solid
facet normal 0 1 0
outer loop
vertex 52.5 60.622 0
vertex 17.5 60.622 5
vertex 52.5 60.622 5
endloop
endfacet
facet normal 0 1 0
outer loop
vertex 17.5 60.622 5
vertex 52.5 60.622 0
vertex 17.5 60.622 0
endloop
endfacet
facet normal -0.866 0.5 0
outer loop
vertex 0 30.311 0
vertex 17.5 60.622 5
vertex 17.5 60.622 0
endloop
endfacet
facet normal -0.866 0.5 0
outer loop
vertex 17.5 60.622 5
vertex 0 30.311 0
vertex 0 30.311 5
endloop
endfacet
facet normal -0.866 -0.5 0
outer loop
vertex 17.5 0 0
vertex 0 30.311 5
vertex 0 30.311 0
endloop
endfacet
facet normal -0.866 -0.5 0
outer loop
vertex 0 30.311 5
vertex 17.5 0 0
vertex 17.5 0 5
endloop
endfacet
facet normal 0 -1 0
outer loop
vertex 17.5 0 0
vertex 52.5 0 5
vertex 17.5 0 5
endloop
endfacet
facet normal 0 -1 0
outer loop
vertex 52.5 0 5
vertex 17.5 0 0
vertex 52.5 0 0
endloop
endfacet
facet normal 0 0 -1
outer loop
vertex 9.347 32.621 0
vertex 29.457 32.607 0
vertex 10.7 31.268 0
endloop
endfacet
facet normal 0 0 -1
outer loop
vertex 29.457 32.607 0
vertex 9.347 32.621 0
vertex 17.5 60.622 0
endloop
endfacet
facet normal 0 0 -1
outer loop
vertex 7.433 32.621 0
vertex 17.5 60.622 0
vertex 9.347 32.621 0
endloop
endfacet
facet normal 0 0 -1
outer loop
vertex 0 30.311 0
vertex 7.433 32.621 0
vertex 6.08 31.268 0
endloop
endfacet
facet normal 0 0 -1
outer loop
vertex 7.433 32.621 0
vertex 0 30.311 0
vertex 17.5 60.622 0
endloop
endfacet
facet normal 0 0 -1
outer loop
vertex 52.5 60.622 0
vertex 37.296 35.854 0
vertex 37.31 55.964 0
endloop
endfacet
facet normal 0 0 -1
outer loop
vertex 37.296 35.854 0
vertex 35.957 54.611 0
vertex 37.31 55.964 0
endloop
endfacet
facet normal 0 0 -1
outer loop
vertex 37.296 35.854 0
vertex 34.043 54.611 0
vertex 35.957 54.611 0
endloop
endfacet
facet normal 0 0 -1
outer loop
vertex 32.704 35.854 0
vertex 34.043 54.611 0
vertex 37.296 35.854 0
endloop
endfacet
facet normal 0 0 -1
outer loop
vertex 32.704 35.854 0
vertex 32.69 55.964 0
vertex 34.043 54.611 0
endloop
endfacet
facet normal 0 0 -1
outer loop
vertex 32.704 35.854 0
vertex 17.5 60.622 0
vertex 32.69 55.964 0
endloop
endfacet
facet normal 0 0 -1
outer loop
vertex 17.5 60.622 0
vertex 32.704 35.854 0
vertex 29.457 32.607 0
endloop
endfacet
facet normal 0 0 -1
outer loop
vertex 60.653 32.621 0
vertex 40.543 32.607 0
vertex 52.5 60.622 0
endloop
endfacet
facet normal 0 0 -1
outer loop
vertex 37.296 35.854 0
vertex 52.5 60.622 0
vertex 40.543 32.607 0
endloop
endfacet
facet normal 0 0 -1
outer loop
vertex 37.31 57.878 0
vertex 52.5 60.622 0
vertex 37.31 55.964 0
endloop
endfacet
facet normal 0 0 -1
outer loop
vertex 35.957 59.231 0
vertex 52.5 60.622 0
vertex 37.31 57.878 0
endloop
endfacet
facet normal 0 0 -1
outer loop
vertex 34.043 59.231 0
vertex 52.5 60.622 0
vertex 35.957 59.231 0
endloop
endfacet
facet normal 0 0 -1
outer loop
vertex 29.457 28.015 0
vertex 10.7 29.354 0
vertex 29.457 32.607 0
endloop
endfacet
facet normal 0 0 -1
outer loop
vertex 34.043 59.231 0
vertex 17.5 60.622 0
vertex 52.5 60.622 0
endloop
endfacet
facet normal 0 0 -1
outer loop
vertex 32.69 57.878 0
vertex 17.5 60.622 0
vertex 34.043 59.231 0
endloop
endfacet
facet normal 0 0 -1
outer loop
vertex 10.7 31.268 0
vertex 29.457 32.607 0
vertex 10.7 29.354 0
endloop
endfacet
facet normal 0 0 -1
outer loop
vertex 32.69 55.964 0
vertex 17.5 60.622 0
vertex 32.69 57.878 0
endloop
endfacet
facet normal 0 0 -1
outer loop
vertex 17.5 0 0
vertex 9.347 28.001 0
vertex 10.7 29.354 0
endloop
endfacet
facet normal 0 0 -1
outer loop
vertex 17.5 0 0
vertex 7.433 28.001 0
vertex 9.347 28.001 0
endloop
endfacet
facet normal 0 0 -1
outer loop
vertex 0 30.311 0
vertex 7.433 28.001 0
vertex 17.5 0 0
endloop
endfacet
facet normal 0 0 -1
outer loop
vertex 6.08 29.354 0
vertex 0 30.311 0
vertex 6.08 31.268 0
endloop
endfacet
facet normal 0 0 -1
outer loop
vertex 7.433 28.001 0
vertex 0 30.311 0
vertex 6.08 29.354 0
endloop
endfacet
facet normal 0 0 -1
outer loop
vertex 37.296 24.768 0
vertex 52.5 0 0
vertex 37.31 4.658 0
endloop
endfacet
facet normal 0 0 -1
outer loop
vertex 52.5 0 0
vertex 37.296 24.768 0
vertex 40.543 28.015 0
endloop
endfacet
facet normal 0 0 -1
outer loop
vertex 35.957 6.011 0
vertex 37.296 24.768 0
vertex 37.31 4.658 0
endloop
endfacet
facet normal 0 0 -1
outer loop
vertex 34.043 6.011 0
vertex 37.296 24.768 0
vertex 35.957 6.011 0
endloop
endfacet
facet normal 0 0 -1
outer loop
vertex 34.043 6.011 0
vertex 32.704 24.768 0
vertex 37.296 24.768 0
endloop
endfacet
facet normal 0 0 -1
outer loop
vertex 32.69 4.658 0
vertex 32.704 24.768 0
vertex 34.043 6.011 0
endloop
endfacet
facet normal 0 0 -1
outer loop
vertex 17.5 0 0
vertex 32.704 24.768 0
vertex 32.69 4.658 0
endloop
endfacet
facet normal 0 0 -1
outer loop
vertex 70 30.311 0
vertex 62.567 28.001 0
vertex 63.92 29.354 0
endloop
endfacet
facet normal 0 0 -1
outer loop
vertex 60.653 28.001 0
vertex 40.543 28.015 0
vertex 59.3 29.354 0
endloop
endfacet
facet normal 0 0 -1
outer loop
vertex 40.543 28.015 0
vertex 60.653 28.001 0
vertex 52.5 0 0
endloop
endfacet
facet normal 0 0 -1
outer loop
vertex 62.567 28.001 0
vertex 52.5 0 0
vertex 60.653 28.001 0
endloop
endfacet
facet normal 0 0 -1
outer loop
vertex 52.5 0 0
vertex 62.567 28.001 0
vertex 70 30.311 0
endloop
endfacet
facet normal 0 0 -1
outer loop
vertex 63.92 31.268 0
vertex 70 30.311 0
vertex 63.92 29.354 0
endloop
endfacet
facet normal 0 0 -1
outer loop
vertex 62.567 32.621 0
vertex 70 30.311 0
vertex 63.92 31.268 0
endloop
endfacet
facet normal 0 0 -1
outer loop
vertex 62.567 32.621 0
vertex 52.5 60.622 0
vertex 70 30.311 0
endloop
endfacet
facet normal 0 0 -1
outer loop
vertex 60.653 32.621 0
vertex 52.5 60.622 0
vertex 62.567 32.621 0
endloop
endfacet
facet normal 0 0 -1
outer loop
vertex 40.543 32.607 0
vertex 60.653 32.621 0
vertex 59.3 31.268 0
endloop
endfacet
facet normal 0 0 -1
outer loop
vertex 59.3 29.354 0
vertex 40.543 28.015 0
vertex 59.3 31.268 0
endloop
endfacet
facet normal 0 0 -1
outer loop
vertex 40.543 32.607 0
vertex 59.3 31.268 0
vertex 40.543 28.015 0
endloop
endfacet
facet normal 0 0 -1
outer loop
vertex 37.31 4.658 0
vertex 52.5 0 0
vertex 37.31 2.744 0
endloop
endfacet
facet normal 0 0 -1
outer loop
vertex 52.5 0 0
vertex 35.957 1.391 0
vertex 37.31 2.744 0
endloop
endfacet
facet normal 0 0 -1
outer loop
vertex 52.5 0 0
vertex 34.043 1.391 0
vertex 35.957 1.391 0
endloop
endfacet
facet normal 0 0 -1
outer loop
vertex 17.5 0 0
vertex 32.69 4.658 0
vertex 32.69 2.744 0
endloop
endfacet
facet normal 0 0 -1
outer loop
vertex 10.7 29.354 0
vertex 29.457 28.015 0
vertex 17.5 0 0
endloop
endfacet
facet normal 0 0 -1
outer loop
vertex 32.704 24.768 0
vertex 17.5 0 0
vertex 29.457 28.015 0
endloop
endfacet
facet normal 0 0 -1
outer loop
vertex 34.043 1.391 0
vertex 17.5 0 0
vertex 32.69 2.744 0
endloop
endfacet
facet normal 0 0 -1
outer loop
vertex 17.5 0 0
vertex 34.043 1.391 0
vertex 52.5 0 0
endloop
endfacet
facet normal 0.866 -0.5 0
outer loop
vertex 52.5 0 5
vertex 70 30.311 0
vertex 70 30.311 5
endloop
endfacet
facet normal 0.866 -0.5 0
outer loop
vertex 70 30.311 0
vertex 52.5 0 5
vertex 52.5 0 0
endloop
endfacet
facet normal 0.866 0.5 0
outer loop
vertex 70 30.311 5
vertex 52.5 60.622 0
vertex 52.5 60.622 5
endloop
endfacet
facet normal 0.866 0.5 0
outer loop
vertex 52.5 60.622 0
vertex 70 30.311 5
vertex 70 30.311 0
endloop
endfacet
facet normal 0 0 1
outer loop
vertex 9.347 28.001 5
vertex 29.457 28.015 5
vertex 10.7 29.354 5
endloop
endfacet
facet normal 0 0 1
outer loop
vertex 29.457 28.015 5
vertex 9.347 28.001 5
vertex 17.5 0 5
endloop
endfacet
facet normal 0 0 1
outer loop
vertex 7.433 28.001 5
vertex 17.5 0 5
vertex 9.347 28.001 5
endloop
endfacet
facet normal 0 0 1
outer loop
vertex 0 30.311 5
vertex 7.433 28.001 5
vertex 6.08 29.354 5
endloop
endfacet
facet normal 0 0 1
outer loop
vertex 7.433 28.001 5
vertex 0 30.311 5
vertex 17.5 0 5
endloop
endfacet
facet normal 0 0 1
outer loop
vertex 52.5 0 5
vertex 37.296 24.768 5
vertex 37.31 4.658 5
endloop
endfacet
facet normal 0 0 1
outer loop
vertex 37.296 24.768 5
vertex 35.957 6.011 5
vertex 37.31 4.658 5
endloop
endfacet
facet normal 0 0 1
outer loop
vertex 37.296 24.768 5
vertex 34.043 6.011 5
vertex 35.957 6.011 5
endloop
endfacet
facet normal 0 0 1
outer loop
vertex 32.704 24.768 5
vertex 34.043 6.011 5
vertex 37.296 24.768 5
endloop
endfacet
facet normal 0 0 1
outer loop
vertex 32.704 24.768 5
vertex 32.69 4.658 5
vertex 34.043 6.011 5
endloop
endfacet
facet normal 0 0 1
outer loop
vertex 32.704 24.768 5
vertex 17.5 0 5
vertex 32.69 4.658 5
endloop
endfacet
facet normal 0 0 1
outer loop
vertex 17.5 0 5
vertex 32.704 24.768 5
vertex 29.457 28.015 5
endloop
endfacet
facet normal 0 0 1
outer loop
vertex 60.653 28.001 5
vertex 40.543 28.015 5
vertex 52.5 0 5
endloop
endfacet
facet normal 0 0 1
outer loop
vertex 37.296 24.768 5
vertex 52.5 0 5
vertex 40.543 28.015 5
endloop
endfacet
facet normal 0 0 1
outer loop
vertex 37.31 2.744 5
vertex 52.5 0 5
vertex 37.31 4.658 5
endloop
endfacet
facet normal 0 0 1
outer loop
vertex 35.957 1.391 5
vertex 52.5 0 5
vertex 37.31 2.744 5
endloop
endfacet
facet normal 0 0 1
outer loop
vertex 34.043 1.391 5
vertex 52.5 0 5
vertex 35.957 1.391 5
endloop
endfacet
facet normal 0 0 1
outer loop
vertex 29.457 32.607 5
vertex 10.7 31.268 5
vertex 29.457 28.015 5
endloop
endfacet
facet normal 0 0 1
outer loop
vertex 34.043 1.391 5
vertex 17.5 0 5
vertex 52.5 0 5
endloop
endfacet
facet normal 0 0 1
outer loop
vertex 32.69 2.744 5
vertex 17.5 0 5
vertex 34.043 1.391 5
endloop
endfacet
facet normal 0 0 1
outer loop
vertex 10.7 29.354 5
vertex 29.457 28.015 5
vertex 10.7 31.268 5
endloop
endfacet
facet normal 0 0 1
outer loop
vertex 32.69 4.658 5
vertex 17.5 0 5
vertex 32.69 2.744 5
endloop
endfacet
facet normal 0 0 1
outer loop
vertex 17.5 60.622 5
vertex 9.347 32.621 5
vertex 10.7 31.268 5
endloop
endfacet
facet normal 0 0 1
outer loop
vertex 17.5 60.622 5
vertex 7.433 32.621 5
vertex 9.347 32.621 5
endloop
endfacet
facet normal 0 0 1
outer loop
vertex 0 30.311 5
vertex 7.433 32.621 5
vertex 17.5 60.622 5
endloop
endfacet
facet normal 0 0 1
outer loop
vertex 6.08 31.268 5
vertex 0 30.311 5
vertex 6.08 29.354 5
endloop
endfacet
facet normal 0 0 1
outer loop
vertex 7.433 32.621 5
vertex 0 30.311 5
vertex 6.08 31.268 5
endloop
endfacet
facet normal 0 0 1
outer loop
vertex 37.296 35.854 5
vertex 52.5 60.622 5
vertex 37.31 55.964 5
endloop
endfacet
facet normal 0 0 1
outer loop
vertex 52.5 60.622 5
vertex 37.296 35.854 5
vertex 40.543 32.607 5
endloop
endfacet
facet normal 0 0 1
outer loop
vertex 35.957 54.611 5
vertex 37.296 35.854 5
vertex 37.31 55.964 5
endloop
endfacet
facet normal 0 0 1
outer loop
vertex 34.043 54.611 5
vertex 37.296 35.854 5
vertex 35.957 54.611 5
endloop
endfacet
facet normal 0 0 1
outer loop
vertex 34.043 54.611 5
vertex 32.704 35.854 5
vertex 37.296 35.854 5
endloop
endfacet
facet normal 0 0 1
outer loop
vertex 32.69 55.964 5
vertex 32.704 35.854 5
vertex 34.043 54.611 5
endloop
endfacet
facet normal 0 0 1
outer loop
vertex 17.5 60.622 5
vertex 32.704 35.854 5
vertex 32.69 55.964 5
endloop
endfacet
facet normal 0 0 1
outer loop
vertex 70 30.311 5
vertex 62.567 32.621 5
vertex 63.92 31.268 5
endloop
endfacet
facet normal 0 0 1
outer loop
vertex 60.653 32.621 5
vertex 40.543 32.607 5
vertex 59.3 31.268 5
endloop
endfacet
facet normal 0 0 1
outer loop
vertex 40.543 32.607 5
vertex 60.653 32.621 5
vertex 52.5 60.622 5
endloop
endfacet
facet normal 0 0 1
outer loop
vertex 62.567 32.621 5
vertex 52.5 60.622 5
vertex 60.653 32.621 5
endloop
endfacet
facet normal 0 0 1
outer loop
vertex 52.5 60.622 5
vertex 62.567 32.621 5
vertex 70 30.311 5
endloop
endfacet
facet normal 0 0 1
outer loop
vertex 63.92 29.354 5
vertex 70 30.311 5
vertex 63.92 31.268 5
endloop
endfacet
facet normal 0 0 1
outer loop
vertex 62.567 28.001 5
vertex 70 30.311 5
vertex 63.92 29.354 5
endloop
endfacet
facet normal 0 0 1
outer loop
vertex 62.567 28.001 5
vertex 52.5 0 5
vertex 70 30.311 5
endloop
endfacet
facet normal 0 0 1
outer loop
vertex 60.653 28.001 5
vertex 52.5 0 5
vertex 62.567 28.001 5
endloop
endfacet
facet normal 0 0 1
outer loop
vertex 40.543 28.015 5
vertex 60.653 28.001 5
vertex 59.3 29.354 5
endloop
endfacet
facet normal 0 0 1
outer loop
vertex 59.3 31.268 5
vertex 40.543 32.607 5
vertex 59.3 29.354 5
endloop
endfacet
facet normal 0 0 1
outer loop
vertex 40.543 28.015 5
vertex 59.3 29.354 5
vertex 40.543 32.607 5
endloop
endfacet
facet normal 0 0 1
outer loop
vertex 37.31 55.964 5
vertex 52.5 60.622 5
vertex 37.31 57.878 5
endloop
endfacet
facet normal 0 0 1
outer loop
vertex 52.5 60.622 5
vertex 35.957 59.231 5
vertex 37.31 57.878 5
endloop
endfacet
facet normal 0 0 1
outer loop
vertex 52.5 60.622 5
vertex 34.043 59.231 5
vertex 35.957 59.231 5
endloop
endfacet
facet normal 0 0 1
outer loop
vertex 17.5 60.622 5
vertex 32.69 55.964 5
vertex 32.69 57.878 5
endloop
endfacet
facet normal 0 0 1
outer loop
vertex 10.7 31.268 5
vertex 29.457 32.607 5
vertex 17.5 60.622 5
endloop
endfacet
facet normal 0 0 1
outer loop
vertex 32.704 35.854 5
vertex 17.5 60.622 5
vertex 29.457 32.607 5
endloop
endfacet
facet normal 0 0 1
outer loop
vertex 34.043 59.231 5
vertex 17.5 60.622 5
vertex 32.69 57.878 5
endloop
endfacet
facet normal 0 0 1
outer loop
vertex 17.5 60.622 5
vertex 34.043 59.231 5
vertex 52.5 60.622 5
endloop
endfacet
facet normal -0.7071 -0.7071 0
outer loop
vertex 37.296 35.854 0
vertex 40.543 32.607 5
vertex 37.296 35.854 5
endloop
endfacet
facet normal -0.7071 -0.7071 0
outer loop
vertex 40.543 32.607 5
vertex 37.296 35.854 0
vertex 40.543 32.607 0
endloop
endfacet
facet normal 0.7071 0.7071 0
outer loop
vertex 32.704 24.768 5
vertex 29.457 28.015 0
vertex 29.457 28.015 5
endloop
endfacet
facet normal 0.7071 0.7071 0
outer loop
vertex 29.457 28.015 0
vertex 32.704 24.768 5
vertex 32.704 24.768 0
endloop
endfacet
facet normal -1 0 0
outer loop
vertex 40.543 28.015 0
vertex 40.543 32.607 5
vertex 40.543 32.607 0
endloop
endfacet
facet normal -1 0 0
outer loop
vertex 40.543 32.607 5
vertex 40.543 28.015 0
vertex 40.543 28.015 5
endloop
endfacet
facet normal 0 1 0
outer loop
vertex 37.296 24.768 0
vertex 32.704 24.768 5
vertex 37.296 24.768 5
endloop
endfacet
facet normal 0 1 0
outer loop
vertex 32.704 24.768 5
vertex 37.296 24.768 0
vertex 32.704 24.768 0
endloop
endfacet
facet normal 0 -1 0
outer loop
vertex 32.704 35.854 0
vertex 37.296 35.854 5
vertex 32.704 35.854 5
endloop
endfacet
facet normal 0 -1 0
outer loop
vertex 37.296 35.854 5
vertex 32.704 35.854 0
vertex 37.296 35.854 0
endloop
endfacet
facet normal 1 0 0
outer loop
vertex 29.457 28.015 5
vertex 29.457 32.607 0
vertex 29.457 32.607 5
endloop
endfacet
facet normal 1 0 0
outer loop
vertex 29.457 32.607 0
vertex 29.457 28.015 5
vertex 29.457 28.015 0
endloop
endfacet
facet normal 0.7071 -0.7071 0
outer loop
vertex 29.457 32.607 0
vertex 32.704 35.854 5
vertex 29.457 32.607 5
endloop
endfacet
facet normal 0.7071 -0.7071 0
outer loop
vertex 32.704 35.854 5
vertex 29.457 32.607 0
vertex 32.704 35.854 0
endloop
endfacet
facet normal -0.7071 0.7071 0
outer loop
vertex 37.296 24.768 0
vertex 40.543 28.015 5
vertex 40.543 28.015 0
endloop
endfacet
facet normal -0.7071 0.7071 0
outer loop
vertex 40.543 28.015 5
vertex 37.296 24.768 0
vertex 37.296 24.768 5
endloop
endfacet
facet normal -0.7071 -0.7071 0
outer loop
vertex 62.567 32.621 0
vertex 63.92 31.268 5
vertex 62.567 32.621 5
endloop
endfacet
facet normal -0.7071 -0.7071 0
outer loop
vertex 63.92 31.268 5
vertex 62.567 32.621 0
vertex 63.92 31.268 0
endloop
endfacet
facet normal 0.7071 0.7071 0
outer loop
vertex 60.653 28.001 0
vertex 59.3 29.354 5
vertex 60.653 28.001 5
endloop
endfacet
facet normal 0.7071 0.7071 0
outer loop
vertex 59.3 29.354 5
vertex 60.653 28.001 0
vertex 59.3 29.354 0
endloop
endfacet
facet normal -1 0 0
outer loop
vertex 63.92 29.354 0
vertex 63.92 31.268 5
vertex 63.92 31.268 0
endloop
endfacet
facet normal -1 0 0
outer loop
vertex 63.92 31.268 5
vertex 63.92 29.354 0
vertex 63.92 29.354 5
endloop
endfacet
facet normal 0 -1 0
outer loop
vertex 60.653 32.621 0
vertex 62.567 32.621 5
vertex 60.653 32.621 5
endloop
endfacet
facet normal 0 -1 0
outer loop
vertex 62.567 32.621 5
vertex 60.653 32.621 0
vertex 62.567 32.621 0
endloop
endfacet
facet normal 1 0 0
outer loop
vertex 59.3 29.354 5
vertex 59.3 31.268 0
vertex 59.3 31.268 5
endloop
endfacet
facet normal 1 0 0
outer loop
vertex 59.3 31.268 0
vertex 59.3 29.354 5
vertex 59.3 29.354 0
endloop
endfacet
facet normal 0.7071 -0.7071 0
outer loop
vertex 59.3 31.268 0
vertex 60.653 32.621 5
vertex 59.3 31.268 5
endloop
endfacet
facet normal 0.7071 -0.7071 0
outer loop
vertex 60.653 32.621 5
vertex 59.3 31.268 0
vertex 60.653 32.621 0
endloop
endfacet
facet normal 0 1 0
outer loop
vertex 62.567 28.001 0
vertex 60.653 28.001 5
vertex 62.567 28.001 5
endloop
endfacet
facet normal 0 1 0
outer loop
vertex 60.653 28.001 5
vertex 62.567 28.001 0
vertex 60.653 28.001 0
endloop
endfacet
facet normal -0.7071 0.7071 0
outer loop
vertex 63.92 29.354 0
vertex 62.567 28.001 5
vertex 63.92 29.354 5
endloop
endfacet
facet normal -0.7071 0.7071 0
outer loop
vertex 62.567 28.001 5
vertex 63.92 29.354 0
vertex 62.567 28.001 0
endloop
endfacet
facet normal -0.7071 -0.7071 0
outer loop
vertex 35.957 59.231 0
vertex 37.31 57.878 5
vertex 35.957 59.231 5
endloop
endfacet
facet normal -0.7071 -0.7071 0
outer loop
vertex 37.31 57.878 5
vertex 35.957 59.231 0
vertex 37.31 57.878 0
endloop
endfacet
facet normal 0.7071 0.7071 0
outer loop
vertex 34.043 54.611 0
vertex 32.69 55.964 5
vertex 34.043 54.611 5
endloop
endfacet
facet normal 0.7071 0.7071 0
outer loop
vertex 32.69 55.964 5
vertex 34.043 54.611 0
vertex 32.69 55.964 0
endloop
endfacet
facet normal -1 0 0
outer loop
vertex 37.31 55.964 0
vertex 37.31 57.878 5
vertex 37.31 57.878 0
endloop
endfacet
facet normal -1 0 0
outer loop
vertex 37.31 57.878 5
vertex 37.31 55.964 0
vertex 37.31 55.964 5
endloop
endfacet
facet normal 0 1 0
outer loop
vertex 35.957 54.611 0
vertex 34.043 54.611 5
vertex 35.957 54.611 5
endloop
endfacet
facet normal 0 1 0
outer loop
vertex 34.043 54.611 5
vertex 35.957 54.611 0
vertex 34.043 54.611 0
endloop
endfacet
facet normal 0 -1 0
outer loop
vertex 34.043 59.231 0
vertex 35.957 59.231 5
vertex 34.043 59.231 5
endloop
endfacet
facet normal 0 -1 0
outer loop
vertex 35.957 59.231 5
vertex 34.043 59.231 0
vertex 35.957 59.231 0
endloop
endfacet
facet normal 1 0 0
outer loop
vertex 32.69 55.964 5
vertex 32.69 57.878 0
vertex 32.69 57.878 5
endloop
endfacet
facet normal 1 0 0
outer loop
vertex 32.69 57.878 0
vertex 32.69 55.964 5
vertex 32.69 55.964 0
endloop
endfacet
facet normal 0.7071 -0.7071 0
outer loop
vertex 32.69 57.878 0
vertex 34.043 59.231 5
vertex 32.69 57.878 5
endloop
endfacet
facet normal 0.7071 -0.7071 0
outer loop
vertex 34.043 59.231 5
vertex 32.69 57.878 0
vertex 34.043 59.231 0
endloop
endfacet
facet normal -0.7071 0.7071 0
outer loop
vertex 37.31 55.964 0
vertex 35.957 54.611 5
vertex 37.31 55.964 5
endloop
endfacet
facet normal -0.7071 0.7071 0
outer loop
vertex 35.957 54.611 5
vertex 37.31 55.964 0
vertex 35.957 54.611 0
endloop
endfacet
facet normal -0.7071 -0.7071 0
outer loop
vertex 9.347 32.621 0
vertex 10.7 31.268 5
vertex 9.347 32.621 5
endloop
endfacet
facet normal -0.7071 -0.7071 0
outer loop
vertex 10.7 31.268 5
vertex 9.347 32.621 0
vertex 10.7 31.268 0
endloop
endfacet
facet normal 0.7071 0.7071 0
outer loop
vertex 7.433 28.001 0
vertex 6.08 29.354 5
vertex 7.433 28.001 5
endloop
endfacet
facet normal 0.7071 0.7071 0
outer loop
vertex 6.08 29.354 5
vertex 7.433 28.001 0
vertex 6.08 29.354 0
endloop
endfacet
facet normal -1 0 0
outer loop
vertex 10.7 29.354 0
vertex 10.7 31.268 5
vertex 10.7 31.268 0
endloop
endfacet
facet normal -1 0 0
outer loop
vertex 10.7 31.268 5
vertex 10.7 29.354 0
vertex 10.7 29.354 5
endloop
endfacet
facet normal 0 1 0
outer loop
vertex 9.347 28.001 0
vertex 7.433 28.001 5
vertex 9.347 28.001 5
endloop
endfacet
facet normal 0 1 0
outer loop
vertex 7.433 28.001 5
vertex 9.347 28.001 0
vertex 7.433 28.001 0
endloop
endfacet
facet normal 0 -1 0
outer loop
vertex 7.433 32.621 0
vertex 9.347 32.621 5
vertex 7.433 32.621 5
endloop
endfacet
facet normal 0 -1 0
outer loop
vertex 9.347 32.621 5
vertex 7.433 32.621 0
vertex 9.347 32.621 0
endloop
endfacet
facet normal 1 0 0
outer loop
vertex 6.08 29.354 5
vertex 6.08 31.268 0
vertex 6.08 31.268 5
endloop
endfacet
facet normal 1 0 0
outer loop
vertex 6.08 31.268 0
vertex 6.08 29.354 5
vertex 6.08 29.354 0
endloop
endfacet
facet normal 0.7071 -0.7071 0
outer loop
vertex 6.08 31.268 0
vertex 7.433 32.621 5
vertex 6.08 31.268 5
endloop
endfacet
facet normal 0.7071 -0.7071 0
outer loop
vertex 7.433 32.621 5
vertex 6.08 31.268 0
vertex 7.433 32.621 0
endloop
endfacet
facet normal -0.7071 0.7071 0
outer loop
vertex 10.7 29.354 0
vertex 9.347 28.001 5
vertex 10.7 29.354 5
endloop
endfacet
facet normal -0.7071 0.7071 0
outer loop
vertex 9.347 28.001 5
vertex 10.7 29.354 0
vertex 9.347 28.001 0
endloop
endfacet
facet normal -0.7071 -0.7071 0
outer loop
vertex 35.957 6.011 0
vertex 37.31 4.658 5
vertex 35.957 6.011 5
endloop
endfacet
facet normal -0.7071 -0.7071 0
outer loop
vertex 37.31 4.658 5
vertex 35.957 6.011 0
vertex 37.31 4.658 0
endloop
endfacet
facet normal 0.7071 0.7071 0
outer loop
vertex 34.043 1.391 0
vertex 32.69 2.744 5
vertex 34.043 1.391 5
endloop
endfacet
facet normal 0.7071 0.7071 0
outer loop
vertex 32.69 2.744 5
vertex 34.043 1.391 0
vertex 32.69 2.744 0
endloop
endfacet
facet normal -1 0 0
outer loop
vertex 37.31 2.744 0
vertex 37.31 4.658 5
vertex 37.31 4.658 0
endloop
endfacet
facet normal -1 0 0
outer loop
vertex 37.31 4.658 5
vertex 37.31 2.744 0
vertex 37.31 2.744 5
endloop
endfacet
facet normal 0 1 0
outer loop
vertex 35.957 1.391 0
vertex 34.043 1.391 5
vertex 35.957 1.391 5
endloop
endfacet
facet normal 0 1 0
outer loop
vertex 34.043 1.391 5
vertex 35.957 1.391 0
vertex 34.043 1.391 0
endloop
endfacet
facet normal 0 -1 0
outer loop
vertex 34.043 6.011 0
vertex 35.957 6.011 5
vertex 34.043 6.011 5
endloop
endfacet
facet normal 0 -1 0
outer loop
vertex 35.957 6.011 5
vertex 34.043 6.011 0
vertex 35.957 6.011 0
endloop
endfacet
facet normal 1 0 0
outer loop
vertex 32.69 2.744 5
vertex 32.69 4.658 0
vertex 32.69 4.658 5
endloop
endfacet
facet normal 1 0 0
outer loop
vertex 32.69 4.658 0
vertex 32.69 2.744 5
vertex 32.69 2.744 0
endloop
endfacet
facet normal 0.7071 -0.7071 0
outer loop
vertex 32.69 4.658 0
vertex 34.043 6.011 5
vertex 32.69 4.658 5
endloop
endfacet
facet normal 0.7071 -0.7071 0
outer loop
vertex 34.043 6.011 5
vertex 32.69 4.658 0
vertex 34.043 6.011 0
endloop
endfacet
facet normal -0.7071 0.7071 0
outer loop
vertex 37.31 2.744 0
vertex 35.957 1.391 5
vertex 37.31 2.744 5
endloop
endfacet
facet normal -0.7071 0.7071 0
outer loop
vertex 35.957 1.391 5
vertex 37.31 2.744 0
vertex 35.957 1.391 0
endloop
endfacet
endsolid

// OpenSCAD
$fn = 32;

// ----------------------------------------------------------------------
// Polygon plate: 6-gon R35, 4 bolt windows
// ----------------------------------------------------------------------

// --- parameters (mm) ---
sides = 6;                // number of polygon sides
plate_r = 35;             // circumscribed radius of the polygon
bore_r = 6;               // centre bore radius
bolts = 4;                // number of bolt windows
ring_r = 26.61;           // bolt-circle radius
bolt_r = 2.5;             // bolt window radius
plate_t = 5;              // plate thickness, Z (extrusion height)

plate_d = 2 * plate_r;  // circumscribed diameter
bore_d = 2 * bore_r;  // centre bore diameter
bolt_d = 2 * bolt_r;  // bolt window diameter
ring_d = 2 * ring_r;  // bolt-circle diameter

profile = [[70, 30.311], [52.5, 60.622], [17.5, 60.622], [0, 30.311], [17.5, 0], [52.5, 0]];  // primary outline, 6 points, counter clockwise
void_1 = [[40.543, 32.607], [37.296, 35.854], [32.704, 35.854], [29.457, 32.607], [29.457, 28.015], [32.704, 24.768], [37.296, 24.768], [40.543, 28.015]];  // centre bore, 8 points
void_2 = [[63.92, 31.268], [62.567, 32.621], [60.653, 32.621], [59.3, 31.268], [59.3, 29.354], [60.653, 28.001], [62.567, 28.001], [63.92, 29.354]];  // bolt window 1, 8 points
void_3 = [[37.31, 57.878], [35.957, 59.231], [34.043, 59.231], [32.69, 57.878], [32.69, 55.964], [34.043, 54.611], [35.957, 54.611], [37.31, 55.964]];  // bolt window 2, 8 points
void_4 = [[10.7, 31.268], [9.347, 32.621], [7.433, 32.621], [6.08, 31.268], [6.08, 29.354], [7.433, 28.001], [9.347, 28.001], [10.7, 29.354]];  // bolt window 3, 8 points
void_5 = [[37.31, 4.658], [35.957, 6.011], [34.043, 6.011], [32.69, 4.658], [32.69, 2.744], [34.043, 1.391], [35.957, 1.391], [37.31, 2.744]];  // bolt window 4, 8 points

// --- the one profile operation ---
difference() {
  linear_extrude(height = plate_t) polygon(points = profile);
  translate([0, 0, -1])
    linear_extrude(height = plate_t + 2) polygon(points = void_1);
  translate([0, 0, -1])
    linear_extrude(height = plate_t + 2) polygon(points = void_2);
  translate([0, 0, -1])
    linear_extrude(height = plate_t + 2) polygon(points = void_3);
  translate([0, 0, -1])
    linear_extrude(height = plate_t + 2) polygon(points = void_4);
  translate([0, 0, -1])
    linear_extrude(height = plate_t + 2) polygon(points = void_5);
}
